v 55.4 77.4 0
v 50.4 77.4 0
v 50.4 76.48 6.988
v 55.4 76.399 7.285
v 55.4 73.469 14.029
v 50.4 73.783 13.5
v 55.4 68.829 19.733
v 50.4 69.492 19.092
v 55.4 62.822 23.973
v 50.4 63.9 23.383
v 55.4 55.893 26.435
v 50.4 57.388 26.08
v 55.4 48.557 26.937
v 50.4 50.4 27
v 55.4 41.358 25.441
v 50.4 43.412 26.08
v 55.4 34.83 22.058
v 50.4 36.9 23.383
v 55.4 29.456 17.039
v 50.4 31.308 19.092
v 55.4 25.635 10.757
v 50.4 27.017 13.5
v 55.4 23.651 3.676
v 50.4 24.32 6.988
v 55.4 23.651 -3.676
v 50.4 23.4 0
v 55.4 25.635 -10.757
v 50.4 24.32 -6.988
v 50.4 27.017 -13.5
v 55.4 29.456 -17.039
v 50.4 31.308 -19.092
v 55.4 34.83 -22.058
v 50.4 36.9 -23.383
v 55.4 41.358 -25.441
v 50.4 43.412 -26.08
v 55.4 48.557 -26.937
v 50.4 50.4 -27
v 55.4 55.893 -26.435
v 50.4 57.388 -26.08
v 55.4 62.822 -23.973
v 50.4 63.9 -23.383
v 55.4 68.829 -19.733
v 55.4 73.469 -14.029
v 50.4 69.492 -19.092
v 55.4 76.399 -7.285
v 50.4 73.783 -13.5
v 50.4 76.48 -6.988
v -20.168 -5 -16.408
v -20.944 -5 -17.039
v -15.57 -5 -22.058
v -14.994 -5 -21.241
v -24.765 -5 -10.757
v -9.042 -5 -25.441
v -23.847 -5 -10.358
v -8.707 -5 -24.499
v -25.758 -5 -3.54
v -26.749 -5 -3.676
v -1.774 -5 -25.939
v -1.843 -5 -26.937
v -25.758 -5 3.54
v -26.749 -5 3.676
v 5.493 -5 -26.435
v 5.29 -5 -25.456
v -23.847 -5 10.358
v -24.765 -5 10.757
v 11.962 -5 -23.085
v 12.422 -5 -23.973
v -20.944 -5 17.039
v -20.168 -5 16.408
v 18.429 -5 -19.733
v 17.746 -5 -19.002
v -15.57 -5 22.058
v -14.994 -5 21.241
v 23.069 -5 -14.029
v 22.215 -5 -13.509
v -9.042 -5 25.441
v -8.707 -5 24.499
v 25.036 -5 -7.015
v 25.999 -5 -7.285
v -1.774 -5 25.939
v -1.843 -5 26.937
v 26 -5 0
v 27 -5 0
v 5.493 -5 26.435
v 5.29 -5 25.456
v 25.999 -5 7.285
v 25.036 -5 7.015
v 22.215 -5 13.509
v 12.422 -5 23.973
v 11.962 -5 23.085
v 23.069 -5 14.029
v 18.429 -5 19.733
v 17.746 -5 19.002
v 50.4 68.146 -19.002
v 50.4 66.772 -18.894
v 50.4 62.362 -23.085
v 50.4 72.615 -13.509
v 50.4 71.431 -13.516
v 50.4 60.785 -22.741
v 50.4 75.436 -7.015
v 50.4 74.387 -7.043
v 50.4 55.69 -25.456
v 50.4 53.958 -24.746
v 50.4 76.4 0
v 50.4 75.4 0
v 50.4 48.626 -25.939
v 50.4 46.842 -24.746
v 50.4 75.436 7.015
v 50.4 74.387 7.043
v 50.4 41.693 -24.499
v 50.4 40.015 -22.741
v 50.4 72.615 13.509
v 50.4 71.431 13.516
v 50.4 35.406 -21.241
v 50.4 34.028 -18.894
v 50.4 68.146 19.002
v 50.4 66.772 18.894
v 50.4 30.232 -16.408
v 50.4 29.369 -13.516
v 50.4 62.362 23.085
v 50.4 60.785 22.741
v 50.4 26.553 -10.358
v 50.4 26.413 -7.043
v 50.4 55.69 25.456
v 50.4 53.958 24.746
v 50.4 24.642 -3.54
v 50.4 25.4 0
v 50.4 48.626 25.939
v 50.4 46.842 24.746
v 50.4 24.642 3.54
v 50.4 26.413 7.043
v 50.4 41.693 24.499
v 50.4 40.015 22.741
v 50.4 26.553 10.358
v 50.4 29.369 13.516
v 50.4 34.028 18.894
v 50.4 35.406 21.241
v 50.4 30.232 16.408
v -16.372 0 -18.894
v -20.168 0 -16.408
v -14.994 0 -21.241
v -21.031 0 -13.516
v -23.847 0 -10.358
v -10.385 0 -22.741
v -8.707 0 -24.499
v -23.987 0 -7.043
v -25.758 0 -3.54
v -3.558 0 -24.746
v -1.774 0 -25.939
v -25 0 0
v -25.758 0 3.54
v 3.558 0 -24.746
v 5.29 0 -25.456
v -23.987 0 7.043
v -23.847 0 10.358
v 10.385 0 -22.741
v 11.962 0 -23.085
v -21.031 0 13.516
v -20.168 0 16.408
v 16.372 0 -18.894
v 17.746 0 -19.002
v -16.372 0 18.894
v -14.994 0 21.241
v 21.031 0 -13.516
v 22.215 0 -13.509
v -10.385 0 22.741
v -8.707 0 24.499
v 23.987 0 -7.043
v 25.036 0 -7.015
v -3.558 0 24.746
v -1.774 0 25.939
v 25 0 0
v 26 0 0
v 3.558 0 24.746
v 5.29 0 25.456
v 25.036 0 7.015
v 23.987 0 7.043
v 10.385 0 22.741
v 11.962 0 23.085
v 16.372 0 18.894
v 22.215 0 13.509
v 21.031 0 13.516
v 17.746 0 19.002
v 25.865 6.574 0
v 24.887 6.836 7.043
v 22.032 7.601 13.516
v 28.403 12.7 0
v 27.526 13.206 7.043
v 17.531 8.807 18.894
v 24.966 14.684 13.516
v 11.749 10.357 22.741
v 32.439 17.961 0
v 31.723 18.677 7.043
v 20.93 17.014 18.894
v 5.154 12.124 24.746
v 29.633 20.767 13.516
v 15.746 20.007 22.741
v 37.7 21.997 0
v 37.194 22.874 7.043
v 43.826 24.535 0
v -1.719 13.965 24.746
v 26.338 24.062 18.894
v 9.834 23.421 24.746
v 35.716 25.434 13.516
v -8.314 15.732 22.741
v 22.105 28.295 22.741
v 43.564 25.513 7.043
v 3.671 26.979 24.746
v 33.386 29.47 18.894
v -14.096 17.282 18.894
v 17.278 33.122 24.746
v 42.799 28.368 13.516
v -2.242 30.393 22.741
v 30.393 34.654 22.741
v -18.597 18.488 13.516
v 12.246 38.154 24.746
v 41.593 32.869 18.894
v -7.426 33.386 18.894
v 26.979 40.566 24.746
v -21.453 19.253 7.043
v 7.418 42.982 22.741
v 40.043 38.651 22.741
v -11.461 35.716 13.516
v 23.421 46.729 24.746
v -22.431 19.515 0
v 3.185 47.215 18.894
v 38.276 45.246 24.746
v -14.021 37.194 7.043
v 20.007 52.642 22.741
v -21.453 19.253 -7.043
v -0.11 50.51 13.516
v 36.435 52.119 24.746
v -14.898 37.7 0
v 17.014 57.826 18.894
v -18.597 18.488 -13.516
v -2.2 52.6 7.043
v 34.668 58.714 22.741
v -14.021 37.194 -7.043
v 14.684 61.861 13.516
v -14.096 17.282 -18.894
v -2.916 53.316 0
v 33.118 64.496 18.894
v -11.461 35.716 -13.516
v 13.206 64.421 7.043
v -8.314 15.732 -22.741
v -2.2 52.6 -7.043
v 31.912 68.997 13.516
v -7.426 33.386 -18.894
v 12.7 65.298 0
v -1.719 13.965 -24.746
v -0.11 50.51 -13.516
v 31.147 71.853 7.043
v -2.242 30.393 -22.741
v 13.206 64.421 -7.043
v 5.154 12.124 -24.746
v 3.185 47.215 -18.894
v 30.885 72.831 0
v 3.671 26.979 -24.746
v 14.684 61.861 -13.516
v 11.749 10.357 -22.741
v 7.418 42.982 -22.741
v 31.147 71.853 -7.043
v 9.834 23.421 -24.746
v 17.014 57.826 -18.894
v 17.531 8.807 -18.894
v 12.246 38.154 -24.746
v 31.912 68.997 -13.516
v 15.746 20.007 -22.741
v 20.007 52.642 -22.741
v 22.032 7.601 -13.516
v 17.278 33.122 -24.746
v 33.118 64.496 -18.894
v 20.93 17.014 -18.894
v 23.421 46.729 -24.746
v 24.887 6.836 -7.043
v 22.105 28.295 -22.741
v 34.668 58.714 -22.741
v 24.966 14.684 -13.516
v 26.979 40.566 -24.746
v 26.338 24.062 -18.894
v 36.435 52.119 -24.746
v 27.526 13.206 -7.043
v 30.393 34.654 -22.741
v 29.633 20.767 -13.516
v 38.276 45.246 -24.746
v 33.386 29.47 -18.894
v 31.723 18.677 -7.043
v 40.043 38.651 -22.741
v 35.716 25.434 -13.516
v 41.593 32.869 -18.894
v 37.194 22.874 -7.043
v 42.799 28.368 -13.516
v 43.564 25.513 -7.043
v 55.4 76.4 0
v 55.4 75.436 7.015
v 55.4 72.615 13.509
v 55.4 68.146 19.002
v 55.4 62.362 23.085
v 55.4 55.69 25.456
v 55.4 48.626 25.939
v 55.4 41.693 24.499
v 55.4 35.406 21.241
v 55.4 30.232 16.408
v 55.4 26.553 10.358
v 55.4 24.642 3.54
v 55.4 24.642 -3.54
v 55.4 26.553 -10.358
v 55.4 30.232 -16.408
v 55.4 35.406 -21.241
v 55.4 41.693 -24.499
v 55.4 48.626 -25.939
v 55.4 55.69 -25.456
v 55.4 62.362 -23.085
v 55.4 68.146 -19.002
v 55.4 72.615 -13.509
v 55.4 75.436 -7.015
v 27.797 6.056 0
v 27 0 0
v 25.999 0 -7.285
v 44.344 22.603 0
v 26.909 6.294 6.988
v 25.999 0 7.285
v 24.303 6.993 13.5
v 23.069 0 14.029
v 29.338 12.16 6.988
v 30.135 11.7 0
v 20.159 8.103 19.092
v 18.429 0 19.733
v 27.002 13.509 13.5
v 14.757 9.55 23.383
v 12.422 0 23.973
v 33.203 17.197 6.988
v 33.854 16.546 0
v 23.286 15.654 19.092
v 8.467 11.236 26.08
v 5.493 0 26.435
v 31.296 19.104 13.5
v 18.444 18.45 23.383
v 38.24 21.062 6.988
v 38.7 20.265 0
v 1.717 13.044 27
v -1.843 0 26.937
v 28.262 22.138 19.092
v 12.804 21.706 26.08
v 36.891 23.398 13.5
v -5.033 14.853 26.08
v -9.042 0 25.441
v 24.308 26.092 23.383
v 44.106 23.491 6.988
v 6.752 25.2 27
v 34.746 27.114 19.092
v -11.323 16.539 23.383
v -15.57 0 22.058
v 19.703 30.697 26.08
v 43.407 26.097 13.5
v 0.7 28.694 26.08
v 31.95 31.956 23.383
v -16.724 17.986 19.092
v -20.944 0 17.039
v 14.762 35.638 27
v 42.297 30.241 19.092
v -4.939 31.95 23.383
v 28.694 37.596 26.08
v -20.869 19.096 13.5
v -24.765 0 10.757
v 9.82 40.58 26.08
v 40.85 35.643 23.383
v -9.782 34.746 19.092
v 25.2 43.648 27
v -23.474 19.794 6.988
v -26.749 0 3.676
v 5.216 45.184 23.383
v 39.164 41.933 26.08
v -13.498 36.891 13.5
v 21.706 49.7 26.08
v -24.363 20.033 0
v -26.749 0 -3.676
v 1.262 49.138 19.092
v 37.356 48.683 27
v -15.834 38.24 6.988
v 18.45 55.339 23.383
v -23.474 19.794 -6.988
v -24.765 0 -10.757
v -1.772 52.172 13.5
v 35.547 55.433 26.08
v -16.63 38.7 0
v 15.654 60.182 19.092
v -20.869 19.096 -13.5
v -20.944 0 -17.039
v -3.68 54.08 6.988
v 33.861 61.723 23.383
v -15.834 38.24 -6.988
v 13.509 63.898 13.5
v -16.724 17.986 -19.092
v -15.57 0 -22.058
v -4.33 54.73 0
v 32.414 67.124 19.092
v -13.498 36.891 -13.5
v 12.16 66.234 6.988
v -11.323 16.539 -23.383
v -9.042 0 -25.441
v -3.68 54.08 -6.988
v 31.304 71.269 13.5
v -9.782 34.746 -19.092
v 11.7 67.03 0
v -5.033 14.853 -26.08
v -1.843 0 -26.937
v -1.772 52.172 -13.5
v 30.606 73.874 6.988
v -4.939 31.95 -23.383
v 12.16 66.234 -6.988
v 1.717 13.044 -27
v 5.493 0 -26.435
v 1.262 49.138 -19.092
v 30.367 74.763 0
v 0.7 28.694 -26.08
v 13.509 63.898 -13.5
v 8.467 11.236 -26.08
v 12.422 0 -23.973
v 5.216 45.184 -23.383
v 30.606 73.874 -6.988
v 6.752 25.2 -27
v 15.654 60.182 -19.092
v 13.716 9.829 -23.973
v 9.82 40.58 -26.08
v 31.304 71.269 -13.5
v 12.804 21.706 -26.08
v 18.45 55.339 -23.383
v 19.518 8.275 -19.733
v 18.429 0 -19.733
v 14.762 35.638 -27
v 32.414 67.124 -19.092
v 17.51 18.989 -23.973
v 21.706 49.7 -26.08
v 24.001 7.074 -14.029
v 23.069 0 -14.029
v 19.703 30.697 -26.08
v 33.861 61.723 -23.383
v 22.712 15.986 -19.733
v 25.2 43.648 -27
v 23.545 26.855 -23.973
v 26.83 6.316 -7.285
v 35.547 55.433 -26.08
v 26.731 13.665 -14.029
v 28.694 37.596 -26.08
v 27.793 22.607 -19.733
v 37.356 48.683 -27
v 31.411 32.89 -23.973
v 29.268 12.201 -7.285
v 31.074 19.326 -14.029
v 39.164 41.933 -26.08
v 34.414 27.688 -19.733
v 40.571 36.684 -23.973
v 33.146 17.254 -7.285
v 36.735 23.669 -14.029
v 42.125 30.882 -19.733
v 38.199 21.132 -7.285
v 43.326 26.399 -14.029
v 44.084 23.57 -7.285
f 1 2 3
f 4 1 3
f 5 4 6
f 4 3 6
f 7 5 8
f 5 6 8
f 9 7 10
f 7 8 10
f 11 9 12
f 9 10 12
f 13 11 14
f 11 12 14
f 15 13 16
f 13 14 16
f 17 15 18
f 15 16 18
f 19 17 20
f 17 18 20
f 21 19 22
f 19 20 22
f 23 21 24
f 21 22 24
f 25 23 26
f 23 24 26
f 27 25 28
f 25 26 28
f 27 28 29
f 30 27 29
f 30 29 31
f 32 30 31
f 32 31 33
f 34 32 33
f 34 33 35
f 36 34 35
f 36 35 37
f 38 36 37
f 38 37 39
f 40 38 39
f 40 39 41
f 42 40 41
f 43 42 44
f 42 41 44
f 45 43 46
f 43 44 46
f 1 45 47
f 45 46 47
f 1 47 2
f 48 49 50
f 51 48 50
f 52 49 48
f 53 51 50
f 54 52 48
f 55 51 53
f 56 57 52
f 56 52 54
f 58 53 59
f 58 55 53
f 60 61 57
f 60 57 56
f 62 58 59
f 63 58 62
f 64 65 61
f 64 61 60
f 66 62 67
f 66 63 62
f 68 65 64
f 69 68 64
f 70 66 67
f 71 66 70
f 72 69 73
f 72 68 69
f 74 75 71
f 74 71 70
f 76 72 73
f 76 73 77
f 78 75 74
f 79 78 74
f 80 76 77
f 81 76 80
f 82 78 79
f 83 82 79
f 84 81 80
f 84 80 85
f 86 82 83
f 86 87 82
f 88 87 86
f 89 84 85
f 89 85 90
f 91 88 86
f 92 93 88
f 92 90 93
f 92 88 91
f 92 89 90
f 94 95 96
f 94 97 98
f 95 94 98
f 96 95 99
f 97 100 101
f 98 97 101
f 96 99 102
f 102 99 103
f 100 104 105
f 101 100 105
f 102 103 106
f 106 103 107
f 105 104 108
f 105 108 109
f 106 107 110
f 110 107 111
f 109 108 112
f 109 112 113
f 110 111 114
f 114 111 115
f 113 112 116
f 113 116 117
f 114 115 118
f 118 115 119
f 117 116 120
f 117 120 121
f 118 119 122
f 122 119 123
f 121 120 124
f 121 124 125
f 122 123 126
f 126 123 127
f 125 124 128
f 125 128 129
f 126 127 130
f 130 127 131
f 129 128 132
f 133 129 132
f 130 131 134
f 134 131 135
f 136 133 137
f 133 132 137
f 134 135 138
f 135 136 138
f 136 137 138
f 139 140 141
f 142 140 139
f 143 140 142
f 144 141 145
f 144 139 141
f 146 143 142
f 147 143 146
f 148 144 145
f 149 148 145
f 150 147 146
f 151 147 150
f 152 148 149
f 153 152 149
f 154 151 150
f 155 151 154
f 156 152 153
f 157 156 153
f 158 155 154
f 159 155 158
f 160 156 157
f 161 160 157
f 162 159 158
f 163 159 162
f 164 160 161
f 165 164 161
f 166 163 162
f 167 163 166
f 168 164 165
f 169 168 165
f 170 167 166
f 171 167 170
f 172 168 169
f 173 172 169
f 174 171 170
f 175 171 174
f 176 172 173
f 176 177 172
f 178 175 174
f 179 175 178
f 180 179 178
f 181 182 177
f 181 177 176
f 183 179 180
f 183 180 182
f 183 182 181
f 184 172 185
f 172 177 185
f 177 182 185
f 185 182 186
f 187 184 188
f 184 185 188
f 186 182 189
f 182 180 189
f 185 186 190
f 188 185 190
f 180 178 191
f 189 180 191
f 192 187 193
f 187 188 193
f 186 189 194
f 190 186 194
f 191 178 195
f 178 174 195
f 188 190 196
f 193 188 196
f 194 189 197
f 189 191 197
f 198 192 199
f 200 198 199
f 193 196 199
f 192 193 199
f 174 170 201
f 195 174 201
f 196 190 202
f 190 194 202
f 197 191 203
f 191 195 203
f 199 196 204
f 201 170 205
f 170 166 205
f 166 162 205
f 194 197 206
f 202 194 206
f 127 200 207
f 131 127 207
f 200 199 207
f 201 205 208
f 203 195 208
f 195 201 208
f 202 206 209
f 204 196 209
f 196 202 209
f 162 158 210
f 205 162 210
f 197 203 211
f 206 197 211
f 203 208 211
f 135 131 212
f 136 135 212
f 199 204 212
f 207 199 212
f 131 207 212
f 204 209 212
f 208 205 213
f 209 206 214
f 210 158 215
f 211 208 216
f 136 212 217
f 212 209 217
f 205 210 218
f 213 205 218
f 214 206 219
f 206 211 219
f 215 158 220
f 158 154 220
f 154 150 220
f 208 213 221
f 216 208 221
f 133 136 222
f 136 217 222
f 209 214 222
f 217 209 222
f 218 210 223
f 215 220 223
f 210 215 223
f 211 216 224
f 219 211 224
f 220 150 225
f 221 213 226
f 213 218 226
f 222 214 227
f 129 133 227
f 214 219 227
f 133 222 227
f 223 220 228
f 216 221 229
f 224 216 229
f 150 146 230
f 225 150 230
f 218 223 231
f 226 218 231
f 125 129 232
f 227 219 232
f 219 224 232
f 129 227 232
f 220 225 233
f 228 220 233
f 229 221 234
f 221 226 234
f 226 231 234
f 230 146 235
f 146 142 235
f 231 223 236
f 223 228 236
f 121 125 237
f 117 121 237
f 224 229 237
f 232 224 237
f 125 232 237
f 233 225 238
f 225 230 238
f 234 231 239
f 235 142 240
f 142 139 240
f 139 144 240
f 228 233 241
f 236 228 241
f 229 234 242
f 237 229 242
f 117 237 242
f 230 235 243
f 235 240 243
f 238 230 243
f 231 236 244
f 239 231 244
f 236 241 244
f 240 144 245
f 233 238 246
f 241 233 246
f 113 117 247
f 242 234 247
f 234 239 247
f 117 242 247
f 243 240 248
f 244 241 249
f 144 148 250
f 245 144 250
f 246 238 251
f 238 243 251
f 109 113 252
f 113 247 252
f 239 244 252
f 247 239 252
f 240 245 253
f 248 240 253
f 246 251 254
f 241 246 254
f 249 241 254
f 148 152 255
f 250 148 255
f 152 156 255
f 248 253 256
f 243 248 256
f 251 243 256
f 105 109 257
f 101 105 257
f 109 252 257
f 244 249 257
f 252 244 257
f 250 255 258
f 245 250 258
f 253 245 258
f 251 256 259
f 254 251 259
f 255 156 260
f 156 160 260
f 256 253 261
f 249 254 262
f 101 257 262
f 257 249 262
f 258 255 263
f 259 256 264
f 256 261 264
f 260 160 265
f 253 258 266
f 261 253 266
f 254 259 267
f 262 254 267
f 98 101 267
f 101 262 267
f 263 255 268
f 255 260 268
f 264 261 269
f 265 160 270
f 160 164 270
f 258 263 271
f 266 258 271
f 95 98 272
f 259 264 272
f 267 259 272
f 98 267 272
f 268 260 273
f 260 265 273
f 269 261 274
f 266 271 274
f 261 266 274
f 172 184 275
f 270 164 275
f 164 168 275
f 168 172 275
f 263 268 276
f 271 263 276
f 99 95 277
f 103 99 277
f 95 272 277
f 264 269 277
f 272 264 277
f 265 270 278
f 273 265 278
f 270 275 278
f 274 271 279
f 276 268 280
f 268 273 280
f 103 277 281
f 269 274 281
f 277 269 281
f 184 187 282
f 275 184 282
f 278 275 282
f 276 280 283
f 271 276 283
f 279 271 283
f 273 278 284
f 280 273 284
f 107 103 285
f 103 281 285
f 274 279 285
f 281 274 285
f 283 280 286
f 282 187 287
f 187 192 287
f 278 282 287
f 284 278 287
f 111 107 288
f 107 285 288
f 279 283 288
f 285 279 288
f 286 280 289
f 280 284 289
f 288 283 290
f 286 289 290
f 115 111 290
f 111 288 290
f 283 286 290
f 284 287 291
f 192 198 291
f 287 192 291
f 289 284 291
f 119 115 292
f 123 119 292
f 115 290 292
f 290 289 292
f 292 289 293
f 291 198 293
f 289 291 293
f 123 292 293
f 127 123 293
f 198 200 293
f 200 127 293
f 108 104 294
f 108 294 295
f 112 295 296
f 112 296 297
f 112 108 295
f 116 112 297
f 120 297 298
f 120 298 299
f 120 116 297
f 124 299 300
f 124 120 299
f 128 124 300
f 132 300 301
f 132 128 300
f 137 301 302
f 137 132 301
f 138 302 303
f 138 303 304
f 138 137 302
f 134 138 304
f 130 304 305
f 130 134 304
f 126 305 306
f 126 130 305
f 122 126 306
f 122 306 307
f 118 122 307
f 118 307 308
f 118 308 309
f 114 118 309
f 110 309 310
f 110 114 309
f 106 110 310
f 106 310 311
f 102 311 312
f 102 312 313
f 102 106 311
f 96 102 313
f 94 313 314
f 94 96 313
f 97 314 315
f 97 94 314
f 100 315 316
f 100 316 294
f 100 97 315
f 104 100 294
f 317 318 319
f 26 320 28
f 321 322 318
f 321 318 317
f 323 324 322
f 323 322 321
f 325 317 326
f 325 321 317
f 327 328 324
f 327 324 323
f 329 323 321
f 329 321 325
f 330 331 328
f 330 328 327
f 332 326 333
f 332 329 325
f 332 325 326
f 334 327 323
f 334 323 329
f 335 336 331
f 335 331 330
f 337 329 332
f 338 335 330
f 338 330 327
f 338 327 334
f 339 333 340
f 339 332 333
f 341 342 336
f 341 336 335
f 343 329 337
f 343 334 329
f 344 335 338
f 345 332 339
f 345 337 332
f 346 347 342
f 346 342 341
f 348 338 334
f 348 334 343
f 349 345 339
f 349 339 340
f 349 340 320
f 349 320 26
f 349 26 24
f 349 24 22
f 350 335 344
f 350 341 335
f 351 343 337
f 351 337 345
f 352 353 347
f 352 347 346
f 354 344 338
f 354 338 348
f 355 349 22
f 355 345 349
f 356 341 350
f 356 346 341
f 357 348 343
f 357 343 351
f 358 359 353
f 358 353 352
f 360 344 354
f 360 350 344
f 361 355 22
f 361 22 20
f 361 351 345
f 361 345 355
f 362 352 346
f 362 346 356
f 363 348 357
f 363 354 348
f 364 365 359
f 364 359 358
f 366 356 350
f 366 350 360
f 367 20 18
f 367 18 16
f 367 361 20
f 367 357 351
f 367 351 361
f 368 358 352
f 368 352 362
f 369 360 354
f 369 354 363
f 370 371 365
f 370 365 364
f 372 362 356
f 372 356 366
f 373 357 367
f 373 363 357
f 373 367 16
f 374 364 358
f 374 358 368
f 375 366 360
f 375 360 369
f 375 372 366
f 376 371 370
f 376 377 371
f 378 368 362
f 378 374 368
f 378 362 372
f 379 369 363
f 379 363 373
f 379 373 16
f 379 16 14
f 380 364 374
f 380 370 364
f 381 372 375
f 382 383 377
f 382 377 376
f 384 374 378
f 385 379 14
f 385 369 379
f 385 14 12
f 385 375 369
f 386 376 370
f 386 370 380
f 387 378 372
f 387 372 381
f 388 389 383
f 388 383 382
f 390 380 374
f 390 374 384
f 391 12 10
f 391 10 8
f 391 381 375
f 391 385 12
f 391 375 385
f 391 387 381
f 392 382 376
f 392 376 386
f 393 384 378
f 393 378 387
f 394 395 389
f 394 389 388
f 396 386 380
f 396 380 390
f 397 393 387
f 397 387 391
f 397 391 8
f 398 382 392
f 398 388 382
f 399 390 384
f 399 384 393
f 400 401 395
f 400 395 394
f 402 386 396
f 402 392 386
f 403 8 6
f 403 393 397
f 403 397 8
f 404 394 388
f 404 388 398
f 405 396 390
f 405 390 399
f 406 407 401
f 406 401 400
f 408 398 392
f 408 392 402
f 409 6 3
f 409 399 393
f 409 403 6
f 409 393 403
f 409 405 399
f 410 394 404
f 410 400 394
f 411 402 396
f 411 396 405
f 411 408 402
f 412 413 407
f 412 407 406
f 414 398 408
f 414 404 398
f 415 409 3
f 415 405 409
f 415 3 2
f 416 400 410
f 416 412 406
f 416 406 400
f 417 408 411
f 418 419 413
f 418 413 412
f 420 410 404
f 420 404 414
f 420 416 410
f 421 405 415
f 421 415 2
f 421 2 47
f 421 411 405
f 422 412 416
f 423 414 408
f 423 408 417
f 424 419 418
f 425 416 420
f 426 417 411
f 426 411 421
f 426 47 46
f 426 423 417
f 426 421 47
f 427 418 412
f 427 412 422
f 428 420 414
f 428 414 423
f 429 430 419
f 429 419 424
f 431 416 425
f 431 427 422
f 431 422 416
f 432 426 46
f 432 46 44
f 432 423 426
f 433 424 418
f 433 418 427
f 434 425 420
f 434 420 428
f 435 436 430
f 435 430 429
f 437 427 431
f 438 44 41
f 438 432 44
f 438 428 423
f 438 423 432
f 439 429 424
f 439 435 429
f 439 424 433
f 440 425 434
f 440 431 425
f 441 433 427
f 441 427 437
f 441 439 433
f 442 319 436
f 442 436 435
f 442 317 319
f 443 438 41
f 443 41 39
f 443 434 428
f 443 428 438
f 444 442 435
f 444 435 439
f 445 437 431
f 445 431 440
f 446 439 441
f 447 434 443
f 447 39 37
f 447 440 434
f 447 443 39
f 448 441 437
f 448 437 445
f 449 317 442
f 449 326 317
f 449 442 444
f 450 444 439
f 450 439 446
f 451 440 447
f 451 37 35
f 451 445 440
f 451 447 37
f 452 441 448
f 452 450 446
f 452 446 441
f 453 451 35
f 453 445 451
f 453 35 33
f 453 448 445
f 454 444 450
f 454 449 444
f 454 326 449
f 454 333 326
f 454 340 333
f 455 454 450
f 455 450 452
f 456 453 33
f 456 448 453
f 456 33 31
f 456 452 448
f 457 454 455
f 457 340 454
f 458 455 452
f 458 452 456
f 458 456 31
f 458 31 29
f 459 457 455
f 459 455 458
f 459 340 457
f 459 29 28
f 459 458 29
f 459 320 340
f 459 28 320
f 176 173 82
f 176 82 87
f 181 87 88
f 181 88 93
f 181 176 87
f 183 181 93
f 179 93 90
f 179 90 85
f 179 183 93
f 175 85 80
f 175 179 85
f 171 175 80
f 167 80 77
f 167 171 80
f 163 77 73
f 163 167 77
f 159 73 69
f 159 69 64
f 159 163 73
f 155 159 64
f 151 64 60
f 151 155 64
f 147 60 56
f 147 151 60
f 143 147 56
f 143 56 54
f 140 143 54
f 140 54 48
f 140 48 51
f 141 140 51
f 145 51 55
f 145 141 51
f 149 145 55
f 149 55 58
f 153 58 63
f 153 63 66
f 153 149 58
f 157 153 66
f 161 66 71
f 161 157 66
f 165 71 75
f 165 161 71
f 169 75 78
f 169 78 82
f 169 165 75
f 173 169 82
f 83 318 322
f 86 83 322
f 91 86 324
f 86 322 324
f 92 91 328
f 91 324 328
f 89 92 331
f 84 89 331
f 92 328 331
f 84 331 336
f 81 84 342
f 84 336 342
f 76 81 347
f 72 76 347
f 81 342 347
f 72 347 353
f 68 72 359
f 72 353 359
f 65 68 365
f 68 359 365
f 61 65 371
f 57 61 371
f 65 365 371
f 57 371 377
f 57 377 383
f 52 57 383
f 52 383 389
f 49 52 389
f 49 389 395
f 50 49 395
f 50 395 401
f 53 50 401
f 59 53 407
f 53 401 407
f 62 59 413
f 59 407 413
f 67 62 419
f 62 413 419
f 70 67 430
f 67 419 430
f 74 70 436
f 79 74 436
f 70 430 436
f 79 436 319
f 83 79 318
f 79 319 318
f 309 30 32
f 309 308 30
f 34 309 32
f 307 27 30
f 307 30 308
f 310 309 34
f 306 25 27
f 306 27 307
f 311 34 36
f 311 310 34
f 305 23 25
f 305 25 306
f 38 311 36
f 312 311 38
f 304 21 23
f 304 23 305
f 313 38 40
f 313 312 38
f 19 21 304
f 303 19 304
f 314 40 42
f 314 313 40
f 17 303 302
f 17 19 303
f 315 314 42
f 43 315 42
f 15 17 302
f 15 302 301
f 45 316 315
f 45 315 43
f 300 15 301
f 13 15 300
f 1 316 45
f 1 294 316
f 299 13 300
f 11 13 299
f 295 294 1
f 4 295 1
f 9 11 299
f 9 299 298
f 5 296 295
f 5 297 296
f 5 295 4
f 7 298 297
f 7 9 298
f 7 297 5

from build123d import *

# Parameters (mm, degrees)
F0_R     = 27
F0_R_2   = 25
F1_ANGLE = 90
F2_R     = 27
F2_R_2   = 26
F3_DEPTH = 5
F4_R     = 27
F4_R_2   = 26
F5_DEPTH = 5


with BuildPart() as f1:
    # F0 (on Front) → F1 (revolve)
    with BuildSketch(Plane.XZ):
        Circle(F0_R)
        Circle(F0_R_2, mode=Mode.SUBTRACT)
    revolve(axis=Axis((50.399996, 0, -9.491349), (0, 0, -1)), revolution_arc=F1_ANGLE)

    # F2 (on Front) → F3 (join)
    with BuildSketch(Plane.XZ):
        Circle(F2_R)
        Circle(F2_R_2, mode=Mode.SUBTRACT)
    extrude(amount=F3_DEPTH)

    # F4 (on face) → F5 (join)
    with BuildSketch(Plane.YZ.offset(50.399996)):
        with Locations((50.399996, 0)):
            Circle(F4_R)
        with Locations((50.399996, 0)):
            Circle(F4_R_2, mode=Mode.SUBTRACT)
    extrude(amount=F5_DEPTH)


solid = f1.part
